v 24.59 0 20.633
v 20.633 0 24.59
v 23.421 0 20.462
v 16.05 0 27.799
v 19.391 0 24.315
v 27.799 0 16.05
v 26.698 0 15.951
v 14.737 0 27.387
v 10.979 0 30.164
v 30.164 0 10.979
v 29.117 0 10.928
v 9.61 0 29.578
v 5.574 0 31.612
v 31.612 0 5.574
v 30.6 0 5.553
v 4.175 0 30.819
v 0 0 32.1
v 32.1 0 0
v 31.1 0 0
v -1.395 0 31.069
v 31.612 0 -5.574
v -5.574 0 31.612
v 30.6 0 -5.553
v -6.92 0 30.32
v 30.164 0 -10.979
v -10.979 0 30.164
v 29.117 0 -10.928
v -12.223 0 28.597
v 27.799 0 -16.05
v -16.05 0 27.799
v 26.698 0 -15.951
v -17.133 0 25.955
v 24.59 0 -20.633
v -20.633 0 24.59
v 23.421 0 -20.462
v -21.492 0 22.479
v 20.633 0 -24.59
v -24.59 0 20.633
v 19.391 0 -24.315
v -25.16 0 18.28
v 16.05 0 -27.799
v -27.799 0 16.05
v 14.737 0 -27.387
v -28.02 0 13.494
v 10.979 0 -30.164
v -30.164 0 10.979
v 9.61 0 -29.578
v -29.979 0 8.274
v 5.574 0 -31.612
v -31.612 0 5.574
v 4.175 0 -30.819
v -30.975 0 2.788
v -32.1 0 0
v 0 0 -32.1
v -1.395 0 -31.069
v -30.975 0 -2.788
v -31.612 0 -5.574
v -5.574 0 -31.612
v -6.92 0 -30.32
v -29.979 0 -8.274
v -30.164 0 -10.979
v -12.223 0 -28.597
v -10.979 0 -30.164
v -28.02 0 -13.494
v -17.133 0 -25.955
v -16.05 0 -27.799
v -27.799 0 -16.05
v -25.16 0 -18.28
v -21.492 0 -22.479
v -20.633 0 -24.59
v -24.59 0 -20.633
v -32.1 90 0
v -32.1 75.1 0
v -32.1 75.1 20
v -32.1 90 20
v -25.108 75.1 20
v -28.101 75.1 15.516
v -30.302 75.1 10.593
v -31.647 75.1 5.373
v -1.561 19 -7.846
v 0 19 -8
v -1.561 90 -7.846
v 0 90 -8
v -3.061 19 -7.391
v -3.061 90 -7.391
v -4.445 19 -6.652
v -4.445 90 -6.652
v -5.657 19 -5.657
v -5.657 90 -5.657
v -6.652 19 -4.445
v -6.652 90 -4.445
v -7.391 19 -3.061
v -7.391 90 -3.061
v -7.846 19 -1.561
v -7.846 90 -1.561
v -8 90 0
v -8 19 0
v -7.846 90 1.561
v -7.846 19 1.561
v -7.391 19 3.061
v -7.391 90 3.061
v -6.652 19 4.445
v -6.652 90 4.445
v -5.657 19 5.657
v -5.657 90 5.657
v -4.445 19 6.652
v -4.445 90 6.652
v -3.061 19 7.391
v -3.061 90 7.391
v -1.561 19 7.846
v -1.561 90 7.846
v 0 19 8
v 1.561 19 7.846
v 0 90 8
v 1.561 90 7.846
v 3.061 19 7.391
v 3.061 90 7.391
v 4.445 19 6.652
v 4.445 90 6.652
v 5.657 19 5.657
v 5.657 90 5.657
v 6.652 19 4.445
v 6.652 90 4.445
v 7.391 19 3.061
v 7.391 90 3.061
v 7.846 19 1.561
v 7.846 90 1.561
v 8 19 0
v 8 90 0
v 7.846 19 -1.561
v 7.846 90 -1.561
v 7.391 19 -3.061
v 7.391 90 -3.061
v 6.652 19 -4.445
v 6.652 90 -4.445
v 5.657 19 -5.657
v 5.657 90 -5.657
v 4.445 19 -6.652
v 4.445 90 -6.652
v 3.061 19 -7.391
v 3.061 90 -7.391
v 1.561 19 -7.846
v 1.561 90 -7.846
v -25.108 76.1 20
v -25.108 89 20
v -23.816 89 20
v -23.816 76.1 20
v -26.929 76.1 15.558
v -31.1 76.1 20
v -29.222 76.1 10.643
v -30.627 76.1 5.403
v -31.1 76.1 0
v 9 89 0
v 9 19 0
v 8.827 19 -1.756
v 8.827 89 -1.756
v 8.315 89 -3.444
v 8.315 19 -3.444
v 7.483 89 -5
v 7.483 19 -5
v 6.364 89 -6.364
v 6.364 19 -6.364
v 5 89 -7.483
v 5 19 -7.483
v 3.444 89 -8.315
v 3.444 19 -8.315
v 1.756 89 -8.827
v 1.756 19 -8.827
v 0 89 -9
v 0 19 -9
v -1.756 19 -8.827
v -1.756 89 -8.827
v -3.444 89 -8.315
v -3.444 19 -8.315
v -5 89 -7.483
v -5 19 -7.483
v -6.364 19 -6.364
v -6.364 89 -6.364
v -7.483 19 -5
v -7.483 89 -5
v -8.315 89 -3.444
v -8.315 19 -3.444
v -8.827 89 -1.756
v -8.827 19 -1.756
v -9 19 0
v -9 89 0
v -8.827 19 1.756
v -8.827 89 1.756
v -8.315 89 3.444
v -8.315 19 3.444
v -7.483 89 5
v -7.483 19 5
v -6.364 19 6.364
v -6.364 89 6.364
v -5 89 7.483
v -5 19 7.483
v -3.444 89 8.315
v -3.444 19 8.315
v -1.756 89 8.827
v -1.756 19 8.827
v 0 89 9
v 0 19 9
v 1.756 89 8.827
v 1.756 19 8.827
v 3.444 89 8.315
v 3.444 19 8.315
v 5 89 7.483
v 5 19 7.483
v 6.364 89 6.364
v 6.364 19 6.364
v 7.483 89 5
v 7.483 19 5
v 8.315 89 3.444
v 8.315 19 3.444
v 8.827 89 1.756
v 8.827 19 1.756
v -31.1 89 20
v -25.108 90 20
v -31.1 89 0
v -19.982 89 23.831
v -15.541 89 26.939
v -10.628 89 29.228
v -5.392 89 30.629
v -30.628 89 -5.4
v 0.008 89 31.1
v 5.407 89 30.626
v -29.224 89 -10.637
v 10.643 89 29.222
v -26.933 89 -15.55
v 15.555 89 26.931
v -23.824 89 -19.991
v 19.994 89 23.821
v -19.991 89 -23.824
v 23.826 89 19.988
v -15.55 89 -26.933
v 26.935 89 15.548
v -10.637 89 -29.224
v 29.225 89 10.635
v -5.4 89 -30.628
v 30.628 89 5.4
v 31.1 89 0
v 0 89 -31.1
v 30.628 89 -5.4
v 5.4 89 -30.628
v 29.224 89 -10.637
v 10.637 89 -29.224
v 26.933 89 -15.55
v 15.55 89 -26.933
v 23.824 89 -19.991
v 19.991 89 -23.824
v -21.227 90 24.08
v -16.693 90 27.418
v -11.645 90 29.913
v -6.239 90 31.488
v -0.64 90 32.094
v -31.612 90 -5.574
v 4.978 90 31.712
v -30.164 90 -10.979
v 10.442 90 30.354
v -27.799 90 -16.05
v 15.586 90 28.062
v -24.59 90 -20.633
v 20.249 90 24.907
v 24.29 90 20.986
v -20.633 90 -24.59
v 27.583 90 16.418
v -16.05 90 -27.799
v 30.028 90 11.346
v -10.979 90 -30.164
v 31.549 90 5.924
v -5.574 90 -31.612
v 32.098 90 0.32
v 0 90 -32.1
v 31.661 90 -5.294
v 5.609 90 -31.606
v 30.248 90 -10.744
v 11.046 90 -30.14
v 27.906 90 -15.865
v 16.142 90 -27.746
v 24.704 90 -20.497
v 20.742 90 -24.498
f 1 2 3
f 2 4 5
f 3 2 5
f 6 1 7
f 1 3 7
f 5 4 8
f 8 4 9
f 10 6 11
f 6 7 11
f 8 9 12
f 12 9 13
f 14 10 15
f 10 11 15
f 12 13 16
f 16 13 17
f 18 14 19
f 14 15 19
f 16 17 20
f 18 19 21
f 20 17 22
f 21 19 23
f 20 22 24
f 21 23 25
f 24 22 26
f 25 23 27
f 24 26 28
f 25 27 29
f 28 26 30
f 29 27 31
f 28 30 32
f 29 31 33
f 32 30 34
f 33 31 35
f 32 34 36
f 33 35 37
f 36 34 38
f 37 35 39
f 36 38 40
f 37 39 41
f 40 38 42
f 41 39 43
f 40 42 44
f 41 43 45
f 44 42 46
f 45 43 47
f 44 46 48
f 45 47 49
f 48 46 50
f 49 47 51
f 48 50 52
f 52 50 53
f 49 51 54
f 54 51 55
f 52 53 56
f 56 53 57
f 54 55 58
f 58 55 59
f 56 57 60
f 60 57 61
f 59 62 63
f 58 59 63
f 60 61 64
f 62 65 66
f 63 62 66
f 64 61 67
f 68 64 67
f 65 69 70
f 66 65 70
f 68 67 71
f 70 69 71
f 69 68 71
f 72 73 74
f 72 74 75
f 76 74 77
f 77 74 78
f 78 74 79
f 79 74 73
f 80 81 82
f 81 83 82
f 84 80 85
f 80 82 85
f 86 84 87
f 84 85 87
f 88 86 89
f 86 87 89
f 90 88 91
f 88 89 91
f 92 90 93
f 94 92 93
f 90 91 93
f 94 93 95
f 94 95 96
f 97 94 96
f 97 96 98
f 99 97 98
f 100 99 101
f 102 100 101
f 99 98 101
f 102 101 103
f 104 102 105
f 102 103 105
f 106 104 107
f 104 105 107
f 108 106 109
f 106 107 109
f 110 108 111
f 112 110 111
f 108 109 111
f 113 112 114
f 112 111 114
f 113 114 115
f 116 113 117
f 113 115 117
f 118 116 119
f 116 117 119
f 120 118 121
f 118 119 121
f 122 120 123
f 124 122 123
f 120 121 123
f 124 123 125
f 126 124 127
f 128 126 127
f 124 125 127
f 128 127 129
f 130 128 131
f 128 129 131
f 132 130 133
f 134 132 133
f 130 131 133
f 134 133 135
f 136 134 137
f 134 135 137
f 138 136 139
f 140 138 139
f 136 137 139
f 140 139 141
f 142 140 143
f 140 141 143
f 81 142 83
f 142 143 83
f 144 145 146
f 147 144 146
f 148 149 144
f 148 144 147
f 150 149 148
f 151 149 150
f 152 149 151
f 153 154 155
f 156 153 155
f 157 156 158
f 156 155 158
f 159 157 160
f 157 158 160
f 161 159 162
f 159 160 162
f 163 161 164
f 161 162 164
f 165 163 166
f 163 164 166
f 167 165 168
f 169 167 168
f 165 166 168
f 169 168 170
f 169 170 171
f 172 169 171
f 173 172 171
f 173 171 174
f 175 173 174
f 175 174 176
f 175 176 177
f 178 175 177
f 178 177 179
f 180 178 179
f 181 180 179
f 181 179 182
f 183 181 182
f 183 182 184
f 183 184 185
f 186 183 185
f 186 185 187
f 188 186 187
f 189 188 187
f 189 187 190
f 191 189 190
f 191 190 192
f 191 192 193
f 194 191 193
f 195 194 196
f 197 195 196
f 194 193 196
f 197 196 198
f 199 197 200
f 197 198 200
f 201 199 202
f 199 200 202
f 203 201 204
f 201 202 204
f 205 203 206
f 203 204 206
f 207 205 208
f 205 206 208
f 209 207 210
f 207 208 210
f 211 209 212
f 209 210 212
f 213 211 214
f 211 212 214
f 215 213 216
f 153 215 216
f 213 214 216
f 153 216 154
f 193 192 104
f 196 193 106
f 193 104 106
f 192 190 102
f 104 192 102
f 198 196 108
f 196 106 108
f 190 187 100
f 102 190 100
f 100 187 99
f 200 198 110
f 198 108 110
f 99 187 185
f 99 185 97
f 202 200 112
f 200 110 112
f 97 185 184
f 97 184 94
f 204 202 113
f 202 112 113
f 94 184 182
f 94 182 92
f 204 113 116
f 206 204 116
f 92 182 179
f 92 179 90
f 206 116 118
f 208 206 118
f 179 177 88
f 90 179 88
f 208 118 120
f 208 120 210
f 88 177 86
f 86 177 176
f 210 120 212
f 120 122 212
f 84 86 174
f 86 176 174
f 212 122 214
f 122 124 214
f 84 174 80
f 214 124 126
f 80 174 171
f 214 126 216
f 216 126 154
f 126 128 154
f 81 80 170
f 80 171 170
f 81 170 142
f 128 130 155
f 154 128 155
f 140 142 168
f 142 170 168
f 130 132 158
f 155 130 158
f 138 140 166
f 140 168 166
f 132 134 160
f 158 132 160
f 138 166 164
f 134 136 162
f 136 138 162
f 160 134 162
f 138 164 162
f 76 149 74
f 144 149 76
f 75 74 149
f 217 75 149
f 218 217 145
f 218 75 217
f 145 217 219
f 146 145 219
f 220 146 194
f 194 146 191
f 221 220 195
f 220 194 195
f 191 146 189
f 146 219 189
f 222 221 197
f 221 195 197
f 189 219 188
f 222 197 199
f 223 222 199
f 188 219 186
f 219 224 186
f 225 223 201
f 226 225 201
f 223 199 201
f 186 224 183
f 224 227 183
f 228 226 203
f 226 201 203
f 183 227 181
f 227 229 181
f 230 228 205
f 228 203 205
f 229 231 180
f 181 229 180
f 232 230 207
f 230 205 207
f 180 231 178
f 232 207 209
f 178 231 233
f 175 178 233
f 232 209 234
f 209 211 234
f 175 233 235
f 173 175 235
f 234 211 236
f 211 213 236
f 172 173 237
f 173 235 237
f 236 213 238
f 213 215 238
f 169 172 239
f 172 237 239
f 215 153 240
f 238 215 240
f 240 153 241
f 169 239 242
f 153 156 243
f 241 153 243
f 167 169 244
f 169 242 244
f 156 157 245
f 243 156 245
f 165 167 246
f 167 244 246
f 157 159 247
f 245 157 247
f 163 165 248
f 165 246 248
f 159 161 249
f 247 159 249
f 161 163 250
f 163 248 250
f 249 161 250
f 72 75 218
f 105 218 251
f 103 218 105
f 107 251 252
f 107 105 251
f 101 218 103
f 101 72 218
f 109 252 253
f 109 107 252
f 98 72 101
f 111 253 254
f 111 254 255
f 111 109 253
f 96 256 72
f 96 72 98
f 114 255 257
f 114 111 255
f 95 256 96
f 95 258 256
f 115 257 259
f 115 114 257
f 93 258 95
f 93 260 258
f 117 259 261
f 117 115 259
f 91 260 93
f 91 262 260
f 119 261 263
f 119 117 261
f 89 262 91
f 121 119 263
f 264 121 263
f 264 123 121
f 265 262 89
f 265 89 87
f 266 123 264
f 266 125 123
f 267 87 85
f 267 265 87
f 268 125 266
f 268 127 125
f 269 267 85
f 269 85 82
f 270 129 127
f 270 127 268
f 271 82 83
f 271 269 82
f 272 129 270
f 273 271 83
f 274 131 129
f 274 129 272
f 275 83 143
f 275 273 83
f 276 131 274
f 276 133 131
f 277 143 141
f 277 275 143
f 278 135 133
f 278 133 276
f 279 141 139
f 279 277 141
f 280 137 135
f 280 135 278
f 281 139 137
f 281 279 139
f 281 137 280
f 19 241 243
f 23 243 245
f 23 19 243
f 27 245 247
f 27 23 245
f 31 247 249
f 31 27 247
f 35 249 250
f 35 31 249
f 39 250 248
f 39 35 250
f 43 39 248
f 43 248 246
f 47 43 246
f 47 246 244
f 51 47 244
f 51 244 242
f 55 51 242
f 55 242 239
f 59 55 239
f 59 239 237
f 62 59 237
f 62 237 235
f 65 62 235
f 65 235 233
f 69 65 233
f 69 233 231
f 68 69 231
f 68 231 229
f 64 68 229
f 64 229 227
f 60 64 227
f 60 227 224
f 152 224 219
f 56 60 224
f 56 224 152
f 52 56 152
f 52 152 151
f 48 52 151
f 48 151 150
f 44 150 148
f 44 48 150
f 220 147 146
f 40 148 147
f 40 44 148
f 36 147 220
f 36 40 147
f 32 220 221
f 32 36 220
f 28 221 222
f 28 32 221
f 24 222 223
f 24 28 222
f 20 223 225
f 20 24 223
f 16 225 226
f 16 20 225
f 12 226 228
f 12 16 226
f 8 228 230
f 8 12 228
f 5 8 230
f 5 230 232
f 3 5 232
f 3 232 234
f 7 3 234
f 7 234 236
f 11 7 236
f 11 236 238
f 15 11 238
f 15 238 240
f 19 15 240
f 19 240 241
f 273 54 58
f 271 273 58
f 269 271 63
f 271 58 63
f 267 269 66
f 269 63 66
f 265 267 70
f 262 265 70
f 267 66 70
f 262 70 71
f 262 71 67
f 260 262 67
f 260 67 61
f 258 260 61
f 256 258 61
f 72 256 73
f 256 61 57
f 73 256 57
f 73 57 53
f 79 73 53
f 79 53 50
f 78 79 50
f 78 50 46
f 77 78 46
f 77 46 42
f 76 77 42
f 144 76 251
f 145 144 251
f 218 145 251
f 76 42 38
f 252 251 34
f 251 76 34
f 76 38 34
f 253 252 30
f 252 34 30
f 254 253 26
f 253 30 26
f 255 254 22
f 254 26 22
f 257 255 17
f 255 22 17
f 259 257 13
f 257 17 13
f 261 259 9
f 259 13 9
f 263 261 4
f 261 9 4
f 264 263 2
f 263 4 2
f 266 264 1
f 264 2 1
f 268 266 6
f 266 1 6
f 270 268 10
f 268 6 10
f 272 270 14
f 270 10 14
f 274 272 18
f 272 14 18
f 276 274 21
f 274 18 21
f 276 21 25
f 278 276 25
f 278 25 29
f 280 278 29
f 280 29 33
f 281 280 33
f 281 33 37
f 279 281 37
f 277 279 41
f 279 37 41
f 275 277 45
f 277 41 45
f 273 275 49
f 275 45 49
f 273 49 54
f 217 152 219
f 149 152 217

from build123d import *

# Parameters (mm, degrees)
SKETCH_4_W          = 9
SKETCH_4_H          = 14.9
EXTRUDE_3_DEPTH     = 20
SHELL_2_OUTLINE_R   = 31.1
SHELL_2_OUTLINE_R_2 = 9
SHELL_2_DEPTH       = 89
SHELL_2_2_OUTLINE_R = 9
SHELL_2_2_DEPTH     = 19
SHELL_START         = 76.1
SHELL_2_3_DEPTH     = 12.9


# Read off the part's stored shape, not the designer's step: 쉘2
with BuildPart() as part:
    # 스케치3 → 회전1 (revolve)
    with BuildSketch(Plane.XY, mode=Mode.PRIVATE) as revolve_1_sk:
        Polygon((0, 19), (8, 19), (8, 90), (32.1, 90), (32.1, 0), (0, 0), align=None)
    revolve(revolve_1_sk.sketch.rotate(Axis((0, 0, 0), (0, 1, 0)), 90), axis=Axis((0, 0, 0), (0, 1, 0)))

    # 스케치4 → 보스-돌출3 (add)
    with BuildSketch(Plane.XY):
        with Locations((-27.6, 82.55)):
            Rectangle(SKETCH_4_W, SKETCH_4_H)
    extrude(amount=EXTRUDE_3_DEPTH)

    # 쉘2 outline → 쉘2 (cut)
    with BuildSketch(Plane(origin=(0, 0, 0), x_dir=(1, 0, 0), z_dir=(0, 1, 0))):
        Circle(SHELL_2_OUTLINE_R)
        Circle(SHELL_2_OUTLINE_R_2, mode=Mode.SUBTRACT)
    extrude(amount=SHELL_2_DEPTH, mode=Mode.SUBTRACT)

    # Shell 2 2 outline → Shell 2 2 (cut)
    with BuildSketch(Plane(origin=(0, 0, 0), x_dir=(1, 0, 0), z_dir=(0, 1, 0))):
        Circle(SHELL_2_2_OUTLINE_R)
    extrude(amount=SHELL_2_2_DEPTH, mode=Mode.SUBTRACT)

    # Shell 2 3 outline → Shell 2 3 (cut)
    with BuildSketch(Plane(origin=(0, 0, 0), x_dir=(1, 0, 0), z_dir=(0, 1, 0)).offset(SHELL_START)):
        with BuildLine():
            ThreePointArc((-23.816170977, -20), (-29.222362305, -10.642534534), (-31.1, 0))
            Line((-31.1, 0), (-31.1, -20))
            Line((-31.1, -20), (-23.816170977, -20))
        make_face()
    extrude(amount=SHELL_2_3_DEPTH, mode=Mode.SUBTRACT)


solid = part.part
